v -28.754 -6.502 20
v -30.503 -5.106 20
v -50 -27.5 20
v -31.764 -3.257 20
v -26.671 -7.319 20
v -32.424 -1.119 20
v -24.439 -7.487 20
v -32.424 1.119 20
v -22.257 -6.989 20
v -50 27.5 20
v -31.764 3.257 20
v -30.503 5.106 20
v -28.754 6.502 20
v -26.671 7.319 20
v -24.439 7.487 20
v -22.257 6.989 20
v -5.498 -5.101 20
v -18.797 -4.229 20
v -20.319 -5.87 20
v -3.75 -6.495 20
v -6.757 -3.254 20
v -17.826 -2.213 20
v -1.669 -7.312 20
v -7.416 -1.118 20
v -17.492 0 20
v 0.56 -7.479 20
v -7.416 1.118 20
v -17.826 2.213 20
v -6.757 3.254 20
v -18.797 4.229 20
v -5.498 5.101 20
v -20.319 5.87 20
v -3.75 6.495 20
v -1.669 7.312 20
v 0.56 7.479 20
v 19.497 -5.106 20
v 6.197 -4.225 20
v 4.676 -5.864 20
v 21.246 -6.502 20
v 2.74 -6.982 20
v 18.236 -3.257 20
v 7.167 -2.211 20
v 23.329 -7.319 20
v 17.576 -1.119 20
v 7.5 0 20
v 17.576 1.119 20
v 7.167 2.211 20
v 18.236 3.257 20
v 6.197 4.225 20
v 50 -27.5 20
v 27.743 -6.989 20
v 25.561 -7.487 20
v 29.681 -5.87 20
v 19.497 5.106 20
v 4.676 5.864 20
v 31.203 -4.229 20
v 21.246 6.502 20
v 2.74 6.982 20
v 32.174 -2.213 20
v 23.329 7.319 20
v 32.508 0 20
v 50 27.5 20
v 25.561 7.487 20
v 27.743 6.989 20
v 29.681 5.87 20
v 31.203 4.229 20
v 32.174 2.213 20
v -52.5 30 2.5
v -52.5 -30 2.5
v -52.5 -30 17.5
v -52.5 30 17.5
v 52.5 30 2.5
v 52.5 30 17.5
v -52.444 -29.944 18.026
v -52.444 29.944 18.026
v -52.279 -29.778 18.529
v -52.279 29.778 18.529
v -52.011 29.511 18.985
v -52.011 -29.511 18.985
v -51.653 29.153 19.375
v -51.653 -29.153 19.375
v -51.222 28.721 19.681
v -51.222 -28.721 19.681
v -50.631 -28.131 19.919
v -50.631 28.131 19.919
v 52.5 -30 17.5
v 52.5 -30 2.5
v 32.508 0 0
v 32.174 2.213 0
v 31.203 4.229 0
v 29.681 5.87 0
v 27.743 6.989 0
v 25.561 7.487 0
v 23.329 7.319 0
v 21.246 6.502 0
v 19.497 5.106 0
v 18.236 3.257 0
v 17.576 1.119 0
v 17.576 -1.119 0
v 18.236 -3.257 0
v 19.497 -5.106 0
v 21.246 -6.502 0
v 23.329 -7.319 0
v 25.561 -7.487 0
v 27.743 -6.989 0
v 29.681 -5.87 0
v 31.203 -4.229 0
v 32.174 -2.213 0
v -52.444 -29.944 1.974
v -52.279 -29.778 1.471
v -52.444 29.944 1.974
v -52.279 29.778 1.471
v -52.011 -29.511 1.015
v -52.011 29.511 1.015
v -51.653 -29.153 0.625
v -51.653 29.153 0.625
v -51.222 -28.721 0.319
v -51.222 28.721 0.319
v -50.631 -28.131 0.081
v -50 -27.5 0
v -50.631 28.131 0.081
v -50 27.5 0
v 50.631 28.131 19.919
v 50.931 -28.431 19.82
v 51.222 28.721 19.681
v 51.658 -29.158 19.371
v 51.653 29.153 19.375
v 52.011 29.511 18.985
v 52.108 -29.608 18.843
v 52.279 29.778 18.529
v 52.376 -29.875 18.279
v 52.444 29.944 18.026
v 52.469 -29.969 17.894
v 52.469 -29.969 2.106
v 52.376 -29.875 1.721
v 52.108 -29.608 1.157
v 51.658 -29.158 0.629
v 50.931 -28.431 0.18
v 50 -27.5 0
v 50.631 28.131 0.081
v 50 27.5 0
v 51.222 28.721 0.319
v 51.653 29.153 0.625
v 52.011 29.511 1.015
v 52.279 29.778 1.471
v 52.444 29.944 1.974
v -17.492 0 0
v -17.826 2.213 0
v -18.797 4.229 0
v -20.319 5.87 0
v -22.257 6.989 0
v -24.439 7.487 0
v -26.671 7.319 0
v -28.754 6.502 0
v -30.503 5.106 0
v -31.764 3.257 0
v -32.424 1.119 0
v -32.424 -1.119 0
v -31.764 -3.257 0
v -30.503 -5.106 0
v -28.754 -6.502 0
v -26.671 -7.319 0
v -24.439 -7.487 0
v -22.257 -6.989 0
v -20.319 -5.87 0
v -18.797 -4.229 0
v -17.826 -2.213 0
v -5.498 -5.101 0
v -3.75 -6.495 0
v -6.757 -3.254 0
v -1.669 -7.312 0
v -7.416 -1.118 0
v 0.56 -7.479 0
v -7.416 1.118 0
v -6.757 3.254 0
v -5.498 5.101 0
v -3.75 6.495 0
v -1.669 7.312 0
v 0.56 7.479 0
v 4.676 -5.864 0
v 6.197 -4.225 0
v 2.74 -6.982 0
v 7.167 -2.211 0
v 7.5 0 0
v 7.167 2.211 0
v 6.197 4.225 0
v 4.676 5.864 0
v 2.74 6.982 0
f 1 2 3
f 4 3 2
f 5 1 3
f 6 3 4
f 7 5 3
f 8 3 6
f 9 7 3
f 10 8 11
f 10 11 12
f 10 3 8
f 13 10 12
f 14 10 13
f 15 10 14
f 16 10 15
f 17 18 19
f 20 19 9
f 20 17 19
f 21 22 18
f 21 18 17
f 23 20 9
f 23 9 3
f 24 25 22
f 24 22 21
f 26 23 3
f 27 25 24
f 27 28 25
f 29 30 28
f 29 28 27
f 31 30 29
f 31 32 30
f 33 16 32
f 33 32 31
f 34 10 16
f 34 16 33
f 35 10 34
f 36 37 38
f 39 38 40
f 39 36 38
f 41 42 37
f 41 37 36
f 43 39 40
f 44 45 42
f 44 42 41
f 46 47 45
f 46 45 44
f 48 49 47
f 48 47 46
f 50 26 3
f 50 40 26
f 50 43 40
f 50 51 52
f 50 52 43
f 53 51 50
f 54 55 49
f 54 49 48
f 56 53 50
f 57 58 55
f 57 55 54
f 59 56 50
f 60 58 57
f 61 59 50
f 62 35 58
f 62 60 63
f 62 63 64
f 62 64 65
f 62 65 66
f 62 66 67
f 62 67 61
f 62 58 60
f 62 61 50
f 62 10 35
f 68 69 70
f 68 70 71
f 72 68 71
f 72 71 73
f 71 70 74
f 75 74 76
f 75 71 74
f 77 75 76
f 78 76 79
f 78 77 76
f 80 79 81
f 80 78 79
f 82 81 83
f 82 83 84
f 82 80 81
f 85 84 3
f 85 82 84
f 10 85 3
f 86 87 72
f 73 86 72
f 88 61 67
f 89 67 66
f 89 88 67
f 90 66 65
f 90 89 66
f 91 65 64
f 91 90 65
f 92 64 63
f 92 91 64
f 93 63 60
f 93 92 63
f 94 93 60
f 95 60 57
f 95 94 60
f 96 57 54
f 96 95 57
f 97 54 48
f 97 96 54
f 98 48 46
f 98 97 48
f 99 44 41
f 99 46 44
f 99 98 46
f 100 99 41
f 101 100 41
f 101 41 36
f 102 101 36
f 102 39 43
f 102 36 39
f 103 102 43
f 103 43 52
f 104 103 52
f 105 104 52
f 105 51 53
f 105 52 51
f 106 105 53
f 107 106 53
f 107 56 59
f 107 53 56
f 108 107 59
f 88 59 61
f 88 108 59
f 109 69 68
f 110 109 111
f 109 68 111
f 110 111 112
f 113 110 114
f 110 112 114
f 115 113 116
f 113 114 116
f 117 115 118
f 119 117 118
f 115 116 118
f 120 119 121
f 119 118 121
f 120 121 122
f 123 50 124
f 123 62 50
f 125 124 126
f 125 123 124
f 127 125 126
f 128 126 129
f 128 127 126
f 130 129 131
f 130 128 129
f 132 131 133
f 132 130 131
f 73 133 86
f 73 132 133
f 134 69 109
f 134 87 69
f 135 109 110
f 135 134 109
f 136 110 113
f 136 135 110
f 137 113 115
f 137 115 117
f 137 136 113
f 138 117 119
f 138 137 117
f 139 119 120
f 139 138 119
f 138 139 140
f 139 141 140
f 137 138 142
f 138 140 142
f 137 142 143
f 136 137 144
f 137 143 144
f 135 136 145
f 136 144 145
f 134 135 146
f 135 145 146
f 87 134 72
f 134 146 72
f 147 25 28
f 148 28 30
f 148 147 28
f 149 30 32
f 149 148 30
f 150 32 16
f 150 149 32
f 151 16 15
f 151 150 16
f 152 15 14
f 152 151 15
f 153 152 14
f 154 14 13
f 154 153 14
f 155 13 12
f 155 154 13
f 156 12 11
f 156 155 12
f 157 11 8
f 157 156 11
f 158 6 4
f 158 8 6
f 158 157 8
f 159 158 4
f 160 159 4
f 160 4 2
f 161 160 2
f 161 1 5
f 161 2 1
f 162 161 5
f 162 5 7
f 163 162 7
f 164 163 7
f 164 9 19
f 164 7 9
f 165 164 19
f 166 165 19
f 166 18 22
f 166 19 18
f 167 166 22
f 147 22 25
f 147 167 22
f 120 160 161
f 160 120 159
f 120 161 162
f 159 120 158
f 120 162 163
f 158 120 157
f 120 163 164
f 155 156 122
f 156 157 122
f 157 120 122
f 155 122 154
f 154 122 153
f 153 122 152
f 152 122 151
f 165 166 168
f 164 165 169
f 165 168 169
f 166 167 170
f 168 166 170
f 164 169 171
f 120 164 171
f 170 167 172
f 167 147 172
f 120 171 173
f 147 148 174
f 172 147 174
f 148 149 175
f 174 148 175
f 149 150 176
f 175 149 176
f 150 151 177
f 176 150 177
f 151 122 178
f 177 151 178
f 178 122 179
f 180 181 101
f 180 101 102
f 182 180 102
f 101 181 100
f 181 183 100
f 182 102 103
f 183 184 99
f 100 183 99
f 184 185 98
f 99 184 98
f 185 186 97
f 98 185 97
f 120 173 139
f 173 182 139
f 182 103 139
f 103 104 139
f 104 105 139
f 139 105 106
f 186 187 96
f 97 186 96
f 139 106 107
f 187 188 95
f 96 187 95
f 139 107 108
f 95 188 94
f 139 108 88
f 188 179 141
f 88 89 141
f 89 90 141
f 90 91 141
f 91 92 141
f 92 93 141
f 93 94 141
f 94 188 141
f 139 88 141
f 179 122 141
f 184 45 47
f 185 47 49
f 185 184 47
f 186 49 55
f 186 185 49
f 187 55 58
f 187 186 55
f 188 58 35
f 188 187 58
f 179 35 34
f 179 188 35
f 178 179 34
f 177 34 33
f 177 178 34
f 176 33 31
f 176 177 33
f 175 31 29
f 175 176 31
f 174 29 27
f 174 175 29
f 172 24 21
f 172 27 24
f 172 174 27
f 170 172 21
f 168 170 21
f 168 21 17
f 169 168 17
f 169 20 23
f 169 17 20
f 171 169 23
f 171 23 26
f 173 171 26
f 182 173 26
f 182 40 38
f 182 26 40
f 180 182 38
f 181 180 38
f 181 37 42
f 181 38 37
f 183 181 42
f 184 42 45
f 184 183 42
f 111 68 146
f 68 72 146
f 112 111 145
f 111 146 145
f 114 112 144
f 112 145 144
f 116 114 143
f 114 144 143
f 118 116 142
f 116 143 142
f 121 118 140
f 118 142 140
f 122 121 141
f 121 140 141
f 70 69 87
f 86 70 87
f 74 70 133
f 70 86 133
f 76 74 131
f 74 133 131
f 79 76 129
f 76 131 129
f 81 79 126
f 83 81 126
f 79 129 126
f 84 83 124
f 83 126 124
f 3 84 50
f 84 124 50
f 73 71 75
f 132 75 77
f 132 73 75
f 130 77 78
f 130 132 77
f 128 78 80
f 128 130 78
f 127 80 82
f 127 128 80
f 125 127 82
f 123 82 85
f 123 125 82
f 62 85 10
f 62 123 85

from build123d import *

# Parameters (mm, degrees)
F0_W     = 104.999994
F0_H     = 59.99988
F1_DEPTH = 20.000011
F2_R     = 7.5
F2_R_2   = 7.507622
F3_DEPTH = 20.001011
F4_R     = 2.5


with BuildPart() as f1:
    # F0 (on Top) → F1 (new body)
    with BuildSketch(Plane.XY):
        Rectangle(F0_W, F0_H)
    extrude(amount=F1_DEPTH)

    # F2 (on Top) → F3 (cut, through all)
    with BuildSketch(Plane.XY):
        Circle(F2_R)
        with Locations((-25, 0)):
            Circle(F2_R_2)
        with Locations((25, 0)):
            Circle(F2_R_2)
    extrude(amount=F3_DEPTH, mode=Mode.SUBTRACT)

    # F4
    f4_edges = [f1.edges().sort_by_distance(p)[0] for p in [
        (0, 29.99994, 0),
        (52.499997, 0, 0),
        (0, -29.99994, 0),
        (-52.499997, 0, 0),
        (0, 29.99994, 20.000011),
        (52.499997, 0, 20.000011),
        (0, -29.99994, 20.000011),
        (-52.499997, 0, 20.000011),
    ]]
    fillet(f4_edges, radius=F4_R)


solid = f1.part
